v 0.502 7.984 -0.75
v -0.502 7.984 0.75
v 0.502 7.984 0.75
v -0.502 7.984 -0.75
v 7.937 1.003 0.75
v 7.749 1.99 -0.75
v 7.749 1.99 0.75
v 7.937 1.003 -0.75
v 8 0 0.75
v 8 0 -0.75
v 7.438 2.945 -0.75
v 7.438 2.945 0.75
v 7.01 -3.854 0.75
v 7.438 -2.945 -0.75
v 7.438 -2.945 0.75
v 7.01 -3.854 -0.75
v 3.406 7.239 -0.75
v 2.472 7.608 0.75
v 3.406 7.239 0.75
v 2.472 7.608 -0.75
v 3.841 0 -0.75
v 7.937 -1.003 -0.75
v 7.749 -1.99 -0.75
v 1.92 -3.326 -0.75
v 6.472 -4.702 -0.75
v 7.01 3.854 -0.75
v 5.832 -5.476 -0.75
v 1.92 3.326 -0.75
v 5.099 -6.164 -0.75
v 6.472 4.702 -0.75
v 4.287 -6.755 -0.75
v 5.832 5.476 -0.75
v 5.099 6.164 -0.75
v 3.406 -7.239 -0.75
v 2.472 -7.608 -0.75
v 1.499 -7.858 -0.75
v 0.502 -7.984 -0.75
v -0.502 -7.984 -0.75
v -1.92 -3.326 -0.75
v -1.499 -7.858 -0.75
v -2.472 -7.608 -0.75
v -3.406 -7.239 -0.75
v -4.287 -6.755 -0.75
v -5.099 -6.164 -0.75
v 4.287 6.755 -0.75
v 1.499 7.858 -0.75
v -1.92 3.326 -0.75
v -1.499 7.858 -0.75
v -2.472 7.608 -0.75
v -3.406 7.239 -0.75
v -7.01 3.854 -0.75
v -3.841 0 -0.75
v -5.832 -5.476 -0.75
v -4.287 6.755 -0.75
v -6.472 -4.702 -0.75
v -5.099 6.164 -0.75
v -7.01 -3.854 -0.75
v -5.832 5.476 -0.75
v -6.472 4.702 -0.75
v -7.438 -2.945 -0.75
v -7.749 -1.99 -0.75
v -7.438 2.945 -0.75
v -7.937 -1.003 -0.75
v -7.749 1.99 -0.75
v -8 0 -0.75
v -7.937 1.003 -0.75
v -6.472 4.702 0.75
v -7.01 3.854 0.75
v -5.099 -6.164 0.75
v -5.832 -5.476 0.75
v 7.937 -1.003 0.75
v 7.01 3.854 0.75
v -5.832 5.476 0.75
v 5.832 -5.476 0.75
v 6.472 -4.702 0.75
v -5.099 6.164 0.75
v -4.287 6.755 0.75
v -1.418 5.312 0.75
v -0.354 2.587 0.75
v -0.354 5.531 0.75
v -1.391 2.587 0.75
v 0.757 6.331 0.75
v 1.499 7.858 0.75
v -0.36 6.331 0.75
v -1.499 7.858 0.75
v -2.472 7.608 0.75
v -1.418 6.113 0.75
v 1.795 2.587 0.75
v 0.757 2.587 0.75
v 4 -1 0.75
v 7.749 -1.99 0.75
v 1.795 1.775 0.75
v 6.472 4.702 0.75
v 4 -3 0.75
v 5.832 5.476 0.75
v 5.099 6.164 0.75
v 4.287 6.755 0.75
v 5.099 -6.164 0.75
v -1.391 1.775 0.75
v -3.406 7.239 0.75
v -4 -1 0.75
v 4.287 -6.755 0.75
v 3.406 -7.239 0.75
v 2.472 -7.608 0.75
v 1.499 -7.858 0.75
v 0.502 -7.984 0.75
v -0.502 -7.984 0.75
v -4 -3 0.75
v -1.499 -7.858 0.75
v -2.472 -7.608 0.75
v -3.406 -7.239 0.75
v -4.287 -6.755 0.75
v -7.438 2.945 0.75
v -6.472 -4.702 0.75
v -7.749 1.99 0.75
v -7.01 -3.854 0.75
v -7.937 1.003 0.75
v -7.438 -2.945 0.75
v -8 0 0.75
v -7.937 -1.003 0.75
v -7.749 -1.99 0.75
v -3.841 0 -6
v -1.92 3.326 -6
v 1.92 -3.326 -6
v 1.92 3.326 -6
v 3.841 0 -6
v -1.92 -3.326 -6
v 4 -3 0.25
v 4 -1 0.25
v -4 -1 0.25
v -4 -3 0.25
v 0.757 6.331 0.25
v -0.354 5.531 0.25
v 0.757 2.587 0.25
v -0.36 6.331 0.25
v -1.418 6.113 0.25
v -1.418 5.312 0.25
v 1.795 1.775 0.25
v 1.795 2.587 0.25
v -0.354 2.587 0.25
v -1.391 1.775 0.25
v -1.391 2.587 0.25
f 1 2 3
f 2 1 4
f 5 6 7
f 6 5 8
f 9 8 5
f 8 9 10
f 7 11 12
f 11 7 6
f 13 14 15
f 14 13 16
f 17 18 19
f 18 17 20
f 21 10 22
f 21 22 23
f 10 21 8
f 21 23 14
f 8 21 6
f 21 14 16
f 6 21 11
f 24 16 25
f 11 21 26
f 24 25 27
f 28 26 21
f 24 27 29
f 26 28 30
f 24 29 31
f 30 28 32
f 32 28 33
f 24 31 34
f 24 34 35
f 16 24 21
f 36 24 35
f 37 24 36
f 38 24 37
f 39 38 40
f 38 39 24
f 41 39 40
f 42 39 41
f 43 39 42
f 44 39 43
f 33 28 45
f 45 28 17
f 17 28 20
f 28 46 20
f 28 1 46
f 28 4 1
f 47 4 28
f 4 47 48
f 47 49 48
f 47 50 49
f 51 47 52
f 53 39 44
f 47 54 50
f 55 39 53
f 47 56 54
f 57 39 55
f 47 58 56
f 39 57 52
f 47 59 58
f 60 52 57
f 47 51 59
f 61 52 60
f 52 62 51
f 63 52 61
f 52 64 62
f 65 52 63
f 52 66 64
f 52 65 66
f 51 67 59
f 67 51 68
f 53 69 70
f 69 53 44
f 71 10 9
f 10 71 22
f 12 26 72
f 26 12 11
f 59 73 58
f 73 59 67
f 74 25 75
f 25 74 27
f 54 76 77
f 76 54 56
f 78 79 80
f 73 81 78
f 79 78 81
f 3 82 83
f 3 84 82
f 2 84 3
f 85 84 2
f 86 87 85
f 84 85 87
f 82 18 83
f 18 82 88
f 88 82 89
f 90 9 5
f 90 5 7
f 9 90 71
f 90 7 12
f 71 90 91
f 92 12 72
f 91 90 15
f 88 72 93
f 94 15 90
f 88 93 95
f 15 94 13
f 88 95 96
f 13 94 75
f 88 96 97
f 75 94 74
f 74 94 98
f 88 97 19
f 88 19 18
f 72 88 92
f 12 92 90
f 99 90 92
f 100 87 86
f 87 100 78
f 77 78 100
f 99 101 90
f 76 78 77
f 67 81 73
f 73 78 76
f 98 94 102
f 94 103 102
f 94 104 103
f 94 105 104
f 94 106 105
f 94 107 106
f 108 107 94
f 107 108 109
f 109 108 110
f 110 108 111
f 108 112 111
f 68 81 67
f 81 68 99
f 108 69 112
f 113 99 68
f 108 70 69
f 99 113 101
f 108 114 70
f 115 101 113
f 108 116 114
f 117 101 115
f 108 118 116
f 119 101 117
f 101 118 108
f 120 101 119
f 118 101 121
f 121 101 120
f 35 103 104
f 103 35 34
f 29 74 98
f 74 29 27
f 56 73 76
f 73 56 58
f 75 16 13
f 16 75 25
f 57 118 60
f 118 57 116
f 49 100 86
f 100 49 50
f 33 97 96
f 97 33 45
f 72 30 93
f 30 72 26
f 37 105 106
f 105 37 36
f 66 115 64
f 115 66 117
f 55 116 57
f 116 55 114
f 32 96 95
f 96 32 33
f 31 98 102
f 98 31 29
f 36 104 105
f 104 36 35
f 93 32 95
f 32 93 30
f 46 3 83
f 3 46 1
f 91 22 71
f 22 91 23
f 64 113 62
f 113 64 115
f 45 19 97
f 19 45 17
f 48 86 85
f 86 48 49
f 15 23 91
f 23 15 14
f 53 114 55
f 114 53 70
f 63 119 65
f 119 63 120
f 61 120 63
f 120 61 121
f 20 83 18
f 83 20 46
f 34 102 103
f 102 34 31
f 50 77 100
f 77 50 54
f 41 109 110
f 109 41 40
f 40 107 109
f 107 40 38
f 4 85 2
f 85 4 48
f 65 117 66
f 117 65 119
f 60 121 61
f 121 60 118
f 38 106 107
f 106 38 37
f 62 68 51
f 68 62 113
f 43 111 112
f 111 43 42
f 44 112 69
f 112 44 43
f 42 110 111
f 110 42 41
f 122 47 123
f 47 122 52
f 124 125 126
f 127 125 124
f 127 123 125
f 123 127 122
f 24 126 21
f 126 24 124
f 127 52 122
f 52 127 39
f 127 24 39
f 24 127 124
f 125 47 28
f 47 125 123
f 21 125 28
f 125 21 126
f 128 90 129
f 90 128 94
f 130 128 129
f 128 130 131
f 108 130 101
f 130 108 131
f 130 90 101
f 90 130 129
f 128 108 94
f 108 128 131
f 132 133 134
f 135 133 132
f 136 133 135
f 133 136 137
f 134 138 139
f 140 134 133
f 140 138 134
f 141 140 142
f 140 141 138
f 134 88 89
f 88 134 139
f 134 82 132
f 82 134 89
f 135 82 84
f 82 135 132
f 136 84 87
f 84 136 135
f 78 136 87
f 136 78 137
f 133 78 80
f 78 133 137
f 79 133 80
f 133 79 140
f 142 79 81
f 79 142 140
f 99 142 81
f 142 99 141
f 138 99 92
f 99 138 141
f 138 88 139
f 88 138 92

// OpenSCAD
$fn = 50;


difference() {
	union() {
		translate(v = [0, 0, -0.7500000000]) {
			cylinder(h = 1.5000000000, r = 8.0000000000);
		}
		translate(v = [0, 0, -6]) {
			linear_extrude(height = 6) {
				polygon(points = [[3.8408550000, 0.0000000000], [1.9204275000, 3.3262780023], [-1.9204275000, 3.3262780023], [-3.8408550000, 0.0000000000], [-1.9204275000, -3.3262780023], [1.9204275000, -3.3262780023]]);
			}
		}
	}
	union() {
		#translate(v = [-4.0000000000, -3.0000000000, 0.2500000000]) {
			cube(size = [8, 2, 0.5000000000]);
		}
		#translate(v = [0, 4, 0.2500000000]) {
			linear_extrude(height = 0.5000000000) {
				text(font = "SegoiUI:Bold", halign = "center", size = 4.5000000000, text = "1", valign = "center");
			}
		}
	}
}
